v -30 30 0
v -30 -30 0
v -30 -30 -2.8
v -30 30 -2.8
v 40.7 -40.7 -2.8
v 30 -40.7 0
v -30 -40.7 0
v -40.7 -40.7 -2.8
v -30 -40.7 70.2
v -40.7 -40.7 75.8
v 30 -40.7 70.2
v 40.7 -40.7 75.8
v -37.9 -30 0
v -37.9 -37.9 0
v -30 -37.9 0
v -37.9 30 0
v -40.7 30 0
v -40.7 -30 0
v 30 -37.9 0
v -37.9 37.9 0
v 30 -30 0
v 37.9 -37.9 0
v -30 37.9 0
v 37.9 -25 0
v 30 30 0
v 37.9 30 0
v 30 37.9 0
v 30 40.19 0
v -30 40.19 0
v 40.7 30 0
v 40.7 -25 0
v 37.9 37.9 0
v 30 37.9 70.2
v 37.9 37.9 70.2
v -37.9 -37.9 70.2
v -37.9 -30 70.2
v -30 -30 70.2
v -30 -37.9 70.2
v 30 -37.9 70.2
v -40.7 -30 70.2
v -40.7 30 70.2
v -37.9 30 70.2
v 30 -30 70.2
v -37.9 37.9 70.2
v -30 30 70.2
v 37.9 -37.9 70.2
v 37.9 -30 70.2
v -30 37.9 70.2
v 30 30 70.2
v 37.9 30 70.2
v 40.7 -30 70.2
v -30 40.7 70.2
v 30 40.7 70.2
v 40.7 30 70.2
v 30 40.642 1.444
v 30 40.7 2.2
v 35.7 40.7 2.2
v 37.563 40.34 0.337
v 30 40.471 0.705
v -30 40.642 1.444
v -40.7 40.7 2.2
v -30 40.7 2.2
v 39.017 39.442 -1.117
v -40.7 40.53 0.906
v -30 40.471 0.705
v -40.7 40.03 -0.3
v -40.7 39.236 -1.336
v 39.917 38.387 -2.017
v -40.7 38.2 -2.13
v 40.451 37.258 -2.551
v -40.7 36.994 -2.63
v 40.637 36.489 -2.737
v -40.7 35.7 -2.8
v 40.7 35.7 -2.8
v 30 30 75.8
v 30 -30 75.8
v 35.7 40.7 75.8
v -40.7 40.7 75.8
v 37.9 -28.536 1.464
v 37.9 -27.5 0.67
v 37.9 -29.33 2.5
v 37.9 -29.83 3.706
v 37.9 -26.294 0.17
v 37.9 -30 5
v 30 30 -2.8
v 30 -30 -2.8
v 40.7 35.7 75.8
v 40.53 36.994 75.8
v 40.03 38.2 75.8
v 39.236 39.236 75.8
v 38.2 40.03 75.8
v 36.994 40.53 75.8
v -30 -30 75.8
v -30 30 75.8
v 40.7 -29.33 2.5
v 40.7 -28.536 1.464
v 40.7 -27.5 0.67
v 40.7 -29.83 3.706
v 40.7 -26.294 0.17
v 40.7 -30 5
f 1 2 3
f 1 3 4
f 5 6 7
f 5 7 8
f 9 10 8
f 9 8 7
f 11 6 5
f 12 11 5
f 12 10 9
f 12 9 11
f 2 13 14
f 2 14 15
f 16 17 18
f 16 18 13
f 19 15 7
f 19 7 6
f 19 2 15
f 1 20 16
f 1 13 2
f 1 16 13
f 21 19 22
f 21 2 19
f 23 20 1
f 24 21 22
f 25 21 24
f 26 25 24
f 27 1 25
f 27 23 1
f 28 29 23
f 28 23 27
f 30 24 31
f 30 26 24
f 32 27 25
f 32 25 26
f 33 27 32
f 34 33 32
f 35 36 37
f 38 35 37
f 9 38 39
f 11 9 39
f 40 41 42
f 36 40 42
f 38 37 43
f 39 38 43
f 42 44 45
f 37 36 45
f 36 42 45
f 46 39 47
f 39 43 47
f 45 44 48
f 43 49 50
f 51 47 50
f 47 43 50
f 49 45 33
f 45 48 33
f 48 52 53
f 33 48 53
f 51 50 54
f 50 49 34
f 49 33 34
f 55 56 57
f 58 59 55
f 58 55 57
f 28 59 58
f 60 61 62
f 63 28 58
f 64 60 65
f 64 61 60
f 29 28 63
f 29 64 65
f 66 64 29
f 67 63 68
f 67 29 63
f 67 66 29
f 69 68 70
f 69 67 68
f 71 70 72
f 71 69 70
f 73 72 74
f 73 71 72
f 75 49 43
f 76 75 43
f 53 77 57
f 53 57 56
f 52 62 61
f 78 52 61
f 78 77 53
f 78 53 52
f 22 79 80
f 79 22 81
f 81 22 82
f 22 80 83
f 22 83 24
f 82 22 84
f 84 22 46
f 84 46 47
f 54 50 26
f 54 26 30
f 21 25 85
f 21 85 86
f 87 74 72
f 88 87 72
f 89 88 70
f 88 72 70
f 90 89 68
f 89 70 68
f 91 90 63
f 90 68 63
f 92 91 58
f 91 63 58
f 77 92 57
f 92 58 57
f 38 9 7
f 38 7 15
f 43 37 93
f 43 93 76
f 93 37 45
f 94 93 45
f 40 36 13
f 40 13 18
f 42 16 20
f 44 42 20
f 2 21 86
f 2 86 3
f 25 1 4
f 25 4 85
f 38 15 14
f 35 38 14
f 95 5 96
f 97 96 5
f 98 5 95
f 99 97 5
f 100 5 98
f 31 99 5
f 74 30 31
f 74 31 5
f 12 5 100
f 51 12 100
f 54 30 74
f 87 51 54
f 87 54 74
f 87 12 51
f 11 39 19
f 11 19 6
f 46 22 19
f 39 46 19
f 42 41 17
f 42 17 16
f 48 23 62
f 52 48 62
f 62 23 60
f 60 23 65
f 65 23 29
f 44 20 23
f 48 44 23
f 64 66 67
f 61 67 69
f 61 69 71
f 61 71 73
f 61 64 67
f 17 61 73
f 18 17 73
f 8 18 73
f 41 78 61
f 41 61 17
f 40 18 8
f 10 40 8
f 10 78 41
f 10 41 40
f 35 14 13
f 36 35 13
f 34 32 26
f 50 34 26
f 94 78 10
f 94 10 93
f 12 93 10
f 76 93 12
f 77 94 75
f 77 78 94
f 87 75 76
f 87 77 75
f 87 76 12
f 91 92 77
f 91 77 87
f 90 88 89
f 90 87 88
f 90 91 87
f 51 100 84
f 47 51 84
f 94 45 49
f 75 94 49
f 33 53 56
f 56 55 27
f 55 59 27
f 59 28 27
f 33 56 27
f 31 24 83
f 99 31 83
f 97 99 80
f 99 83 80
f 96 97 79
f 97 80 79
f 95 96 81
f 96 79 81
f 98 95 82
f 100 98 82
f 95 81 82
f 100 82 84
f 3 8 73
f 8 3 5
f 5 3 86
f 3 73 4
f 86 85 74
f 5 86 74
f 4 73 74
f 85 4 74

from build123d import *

# Parameters (mm, degrees)
F0_W        = 60
F0_H        = 2.8
F0_W_2      = 2.8
F0_H_2      = 60
F0_W_3      = 7.9
F0_H_3      = 7.9
F1_DEPTH    = 75.8
F2_DEPTH    = 70.2
F3_DEPTH    = 75.8
F4_DEPTH    = 2.8
F5_T1_DEPTH = 2.8
F5_T3_DEPTH = 106.4
F5_T5_DEPTH = 103.6


# Not quite as in the source:
# - a fillet or chamfer that OpenCascade refuses, or shapes differently, is made with other operations: its cross-section is extruded or revolved along the edge and cut away or added


with BuildPart() as f1:
    # F0 (on Top) → F1 (new body)
    with BuildSketch(Plane.XY):
        with Locations((0, 39.3)):
            Rectangle(F0_W, F0_H)
        Polygon((-40.7, 30), (-37.9, 30), (-37.9, 37.9), (-30, 37.9), (-30, 40.7), (-40.7, 40.7), align=None)
        Polygon((37.9, 37.9), (37.9, 30), (40.7, 30), (40.7, 40.7), (30, 40.7), (30, 37.9), align=None)
        with Locations((39.3, 0)):
            Rectangle(F0_W_2, F0_H_2)
        Polygon((37.9, -30), (37.9, -37.9), (30, -37.9), (30, -40.7), (40.7, -40.7), (40.7, -30), align=None)
        with Locations((0, -39.3)):
            Rectangle(F0_W, F0_H)
        Polygon((-30, -40.7), (-30, -37.9), (-37.9, -37.9), (-37.9, -30), (-40.7, -30), (-40.7, -40.7), align=None)
        with Locations((-39.3, 0)):
            Rectangle(F0_W_2, F0_H_2)
        with Locations((33.95, -33.95)):
            Rectangle(F0_W_3, F0_H_3)
        with Locations((33.95, 33.95)):
            Rectangle(F0_W_3, F0_H_3)
        with Locations((-33.95, 33.95)):
            Rectangle(F0_W_3, F0_H_3)
        with Locations((-33.95, 0)):
            Rectangle(F0_W_3, F0_H_2)
        with Locations((33.95, 0)):
            Rectangle(F0_W_3, F0_H_2)
        with Locations((-33.95, -33.95)):
            Rectangle(F0_W_3, F0_H_3)
        with Locations((0, -33.95)):
            Rectangle(F0_W, F0_H_3)
        with Locations((0, 33.95)):
            Rectangle(F0_W, F0_H_3)
    extrude(amount=F1_DEPTH)

    # F0 (on Top) → F2 (cut)
    with BuildSketch(Plane.XY):
        Polygon((-40.7, 30), (-37.9, 30), (-37.9, 37.9), (-30, 37.9), (-30, 40.7), (-40.7, 40.7), align=None)
        with Locations((-33.95, 33.95)):
            Rectangle(F0_W_3, F0_H_3)
        with Locations((-39.3, 0)):
            Rectangle(F0_W_2, F0_H_2)
        with Locations((-33.95, 0)):
            Rectangle(F0_W_3, F0_H_2)
        Polygon((-30, -40.7), (-30, -37.9), (-37.9, -37.9), (-37.9, -30), (-40.7, -30), (-40.7, -40.7), align=None)
        with Locations((-33.95, -33.95)):
            Rectangle(F0_W_3, F0_H_3)
        with Locations((0, -39.3)):
            Rectangle(F0_W, F0_H)
        with Locations((33.95, -33.95)):
            Rectangle(F0_W_3, F0_H_3)
        with Locations((33.95, 0)):
            Rectangle(F0_W_3, F0_H_2)
        with Locations((33.95, 33.95)):
            Rectangle(F0_W_3, F0_H_3)
        with Locations((0, 33.95)):
            Rectangle(F0_W, F0_H_3)
        with Locations((0, 39.3)):
            Rectangle(F0_W, F0_H)
        Polygon((37.9, 37.9), (37.9, 30), (40.7, 30), (40.7, 40.7), (30, 40.7), (30, 37.9), align=None)
        with Locations((39.3, 0)):
            Rectangle(F0_W_2, F0_H_2)
        Polygon((37.9, -30), (37.9, -37.9), (30, -37.9), (30, -40.7), (40.7, -40.7), (40.7, -30), align=None)
        with Locations((0, -33.95)):
            Rectangle(F0_W, F0_H_3)
    extrude(amount=F2_DEPTH, mode=Mode.SUBTRACT)

    # F0 (on Top) → F3 (join)
    with BuildSketch(Plane.XY):
        Polygon((-30, -40.7), (-30, -37.9), (-37.9, -37.9), (-37.9, -30), (-40.7, -30), (-40.7, -40.7), align=None)
        Polygon((37.9, -30), (37.9, -37.9), (30, -37.9), (30, -40.7), (40.7, -40.7), (40.7, -30), align=None)
        Polygon((37.9, 37.9), (37.9, 30), (40.7, 30), (40.7, 40.7), (30, 40.7), (30, 37.9), align=None)
        Polygon((-40.7, 30), (-37.9, 30), (-37.9, 37.9), (-30, 37.9), (-30, 40.7), (-40.7, 40.7), align=None)
    extrude(amount=F3_DEPTH)

    # F0 (on Top) → F4 (join)
    with BuildSketch(Plane.XY):
        Polygon((-30, -40.7), (-30, -37.9), (-37.9, -37.9), (-37.9, -30), (-40.7, -30), (-40.7, -40.7), align=None)
        with Locations((-33.95, -33.95)):
            Rectangle(F0_W_3, F0_H_3)
        with Locations((0, -33.95)):
            Rectangle(F0_W, F0_H_3)
        with Locations((0, -39.3)):
            Rectangle(F0_W, F0_H)
        Polygon((37.9, -30), (37.9, -37.9), (30, -37.9), (30, -40.7), (40.7, -40.7), (40.7, -30), align=None)
        with Locations((33.95, -33.95)):
            Rectangle(F0_W_3, F0_H_3)
        with Locations((39.3, 0)):
            Rectangle(F0_W_2, F0_H_2)
        with Locations((33.95, 0)):
            Rectangle(F0_W_3, F0_H_2)
        with Locations((33.95, 33.95)):
            Rectangle(F0_W_3, F0_H_3)
        Polygon((37.9, 37.9), (37.9, 30), (40.7, 30), (40.7, 40.7), (30, 40.7), (30, 37.9), align=None)
        with Locations((0, 33.95)):
            Rectangle(F0_W, F0_H_3)
        with Locations((0, 39.3)):
            Rectangle(F0_W, F0_H)
        with Locations((-33.95, 33.95)):
            Rectangle(F0_W_3, F0_H_3)
        Polygon((-40.7, 30), (-37.9, 30), (-37.9, 37.9), (-30, 37.9), (-30, 40.7), (-40.7, 40.7), align=None)
        with Locations((-39.3, 0)):
            Rectangle(F0_W_2, F0_H_2)
        with Locations((-33.95, 0)):
            Rectangle(F0_W_3, F0_H_2)
    extrude(amount=-F4_DEPTH)

    # F5: fillet of radius 5 on 3 edges, made by hand

    # F5_s2 → F5_t1 (join)
    with BuildSketch(Plane.YZ.offset(37.9)):
        with BuildLine():
            ThreePointArc((-25, 0), (-28.5355339059, 1.4644660941), (-30, 5))
            Line((-30, 5), (-30, 0))
            Line((-30, 0), (-25, 0))
        make_face()
    extrude(amount=F5_T1_DEPTH)

    # F5_s4 → F5_t3 (cut)
    with BuildSketch(Plane.YZ.offset(-53.2)):
        with BuildLine():
            ThreePointArc((40.7, 2.2), (39.2355339059, -1.3355339059), (35.7, -2.8))
            Line((35.7, -2.8), (40.7, -2.8))
            Line((40.7, -2.8), (40.7, 2.2))
        make_face()
    extrude(amount=F5_T3_DEPTH, mode=Mode.SUBTRACT)

    # F5_s6 → F5_t5 (cut)
    with BuildSketch(Plane.XY.offset(-15.3)):
        with BuildLine():
            ThreePointArc((40.7, 35.7), (39.2355339059, 39.2355339059), (35.7, 40.7))
            Line((35.7, 40.7), (40.7, 40.7))
            Line((40.7, 40.7), (40.7, 35.7))
        make_face()
    extrude(amount=F5_T5_DEPTH, mode=Mode.SUBTRACT)


solid = f1.part
